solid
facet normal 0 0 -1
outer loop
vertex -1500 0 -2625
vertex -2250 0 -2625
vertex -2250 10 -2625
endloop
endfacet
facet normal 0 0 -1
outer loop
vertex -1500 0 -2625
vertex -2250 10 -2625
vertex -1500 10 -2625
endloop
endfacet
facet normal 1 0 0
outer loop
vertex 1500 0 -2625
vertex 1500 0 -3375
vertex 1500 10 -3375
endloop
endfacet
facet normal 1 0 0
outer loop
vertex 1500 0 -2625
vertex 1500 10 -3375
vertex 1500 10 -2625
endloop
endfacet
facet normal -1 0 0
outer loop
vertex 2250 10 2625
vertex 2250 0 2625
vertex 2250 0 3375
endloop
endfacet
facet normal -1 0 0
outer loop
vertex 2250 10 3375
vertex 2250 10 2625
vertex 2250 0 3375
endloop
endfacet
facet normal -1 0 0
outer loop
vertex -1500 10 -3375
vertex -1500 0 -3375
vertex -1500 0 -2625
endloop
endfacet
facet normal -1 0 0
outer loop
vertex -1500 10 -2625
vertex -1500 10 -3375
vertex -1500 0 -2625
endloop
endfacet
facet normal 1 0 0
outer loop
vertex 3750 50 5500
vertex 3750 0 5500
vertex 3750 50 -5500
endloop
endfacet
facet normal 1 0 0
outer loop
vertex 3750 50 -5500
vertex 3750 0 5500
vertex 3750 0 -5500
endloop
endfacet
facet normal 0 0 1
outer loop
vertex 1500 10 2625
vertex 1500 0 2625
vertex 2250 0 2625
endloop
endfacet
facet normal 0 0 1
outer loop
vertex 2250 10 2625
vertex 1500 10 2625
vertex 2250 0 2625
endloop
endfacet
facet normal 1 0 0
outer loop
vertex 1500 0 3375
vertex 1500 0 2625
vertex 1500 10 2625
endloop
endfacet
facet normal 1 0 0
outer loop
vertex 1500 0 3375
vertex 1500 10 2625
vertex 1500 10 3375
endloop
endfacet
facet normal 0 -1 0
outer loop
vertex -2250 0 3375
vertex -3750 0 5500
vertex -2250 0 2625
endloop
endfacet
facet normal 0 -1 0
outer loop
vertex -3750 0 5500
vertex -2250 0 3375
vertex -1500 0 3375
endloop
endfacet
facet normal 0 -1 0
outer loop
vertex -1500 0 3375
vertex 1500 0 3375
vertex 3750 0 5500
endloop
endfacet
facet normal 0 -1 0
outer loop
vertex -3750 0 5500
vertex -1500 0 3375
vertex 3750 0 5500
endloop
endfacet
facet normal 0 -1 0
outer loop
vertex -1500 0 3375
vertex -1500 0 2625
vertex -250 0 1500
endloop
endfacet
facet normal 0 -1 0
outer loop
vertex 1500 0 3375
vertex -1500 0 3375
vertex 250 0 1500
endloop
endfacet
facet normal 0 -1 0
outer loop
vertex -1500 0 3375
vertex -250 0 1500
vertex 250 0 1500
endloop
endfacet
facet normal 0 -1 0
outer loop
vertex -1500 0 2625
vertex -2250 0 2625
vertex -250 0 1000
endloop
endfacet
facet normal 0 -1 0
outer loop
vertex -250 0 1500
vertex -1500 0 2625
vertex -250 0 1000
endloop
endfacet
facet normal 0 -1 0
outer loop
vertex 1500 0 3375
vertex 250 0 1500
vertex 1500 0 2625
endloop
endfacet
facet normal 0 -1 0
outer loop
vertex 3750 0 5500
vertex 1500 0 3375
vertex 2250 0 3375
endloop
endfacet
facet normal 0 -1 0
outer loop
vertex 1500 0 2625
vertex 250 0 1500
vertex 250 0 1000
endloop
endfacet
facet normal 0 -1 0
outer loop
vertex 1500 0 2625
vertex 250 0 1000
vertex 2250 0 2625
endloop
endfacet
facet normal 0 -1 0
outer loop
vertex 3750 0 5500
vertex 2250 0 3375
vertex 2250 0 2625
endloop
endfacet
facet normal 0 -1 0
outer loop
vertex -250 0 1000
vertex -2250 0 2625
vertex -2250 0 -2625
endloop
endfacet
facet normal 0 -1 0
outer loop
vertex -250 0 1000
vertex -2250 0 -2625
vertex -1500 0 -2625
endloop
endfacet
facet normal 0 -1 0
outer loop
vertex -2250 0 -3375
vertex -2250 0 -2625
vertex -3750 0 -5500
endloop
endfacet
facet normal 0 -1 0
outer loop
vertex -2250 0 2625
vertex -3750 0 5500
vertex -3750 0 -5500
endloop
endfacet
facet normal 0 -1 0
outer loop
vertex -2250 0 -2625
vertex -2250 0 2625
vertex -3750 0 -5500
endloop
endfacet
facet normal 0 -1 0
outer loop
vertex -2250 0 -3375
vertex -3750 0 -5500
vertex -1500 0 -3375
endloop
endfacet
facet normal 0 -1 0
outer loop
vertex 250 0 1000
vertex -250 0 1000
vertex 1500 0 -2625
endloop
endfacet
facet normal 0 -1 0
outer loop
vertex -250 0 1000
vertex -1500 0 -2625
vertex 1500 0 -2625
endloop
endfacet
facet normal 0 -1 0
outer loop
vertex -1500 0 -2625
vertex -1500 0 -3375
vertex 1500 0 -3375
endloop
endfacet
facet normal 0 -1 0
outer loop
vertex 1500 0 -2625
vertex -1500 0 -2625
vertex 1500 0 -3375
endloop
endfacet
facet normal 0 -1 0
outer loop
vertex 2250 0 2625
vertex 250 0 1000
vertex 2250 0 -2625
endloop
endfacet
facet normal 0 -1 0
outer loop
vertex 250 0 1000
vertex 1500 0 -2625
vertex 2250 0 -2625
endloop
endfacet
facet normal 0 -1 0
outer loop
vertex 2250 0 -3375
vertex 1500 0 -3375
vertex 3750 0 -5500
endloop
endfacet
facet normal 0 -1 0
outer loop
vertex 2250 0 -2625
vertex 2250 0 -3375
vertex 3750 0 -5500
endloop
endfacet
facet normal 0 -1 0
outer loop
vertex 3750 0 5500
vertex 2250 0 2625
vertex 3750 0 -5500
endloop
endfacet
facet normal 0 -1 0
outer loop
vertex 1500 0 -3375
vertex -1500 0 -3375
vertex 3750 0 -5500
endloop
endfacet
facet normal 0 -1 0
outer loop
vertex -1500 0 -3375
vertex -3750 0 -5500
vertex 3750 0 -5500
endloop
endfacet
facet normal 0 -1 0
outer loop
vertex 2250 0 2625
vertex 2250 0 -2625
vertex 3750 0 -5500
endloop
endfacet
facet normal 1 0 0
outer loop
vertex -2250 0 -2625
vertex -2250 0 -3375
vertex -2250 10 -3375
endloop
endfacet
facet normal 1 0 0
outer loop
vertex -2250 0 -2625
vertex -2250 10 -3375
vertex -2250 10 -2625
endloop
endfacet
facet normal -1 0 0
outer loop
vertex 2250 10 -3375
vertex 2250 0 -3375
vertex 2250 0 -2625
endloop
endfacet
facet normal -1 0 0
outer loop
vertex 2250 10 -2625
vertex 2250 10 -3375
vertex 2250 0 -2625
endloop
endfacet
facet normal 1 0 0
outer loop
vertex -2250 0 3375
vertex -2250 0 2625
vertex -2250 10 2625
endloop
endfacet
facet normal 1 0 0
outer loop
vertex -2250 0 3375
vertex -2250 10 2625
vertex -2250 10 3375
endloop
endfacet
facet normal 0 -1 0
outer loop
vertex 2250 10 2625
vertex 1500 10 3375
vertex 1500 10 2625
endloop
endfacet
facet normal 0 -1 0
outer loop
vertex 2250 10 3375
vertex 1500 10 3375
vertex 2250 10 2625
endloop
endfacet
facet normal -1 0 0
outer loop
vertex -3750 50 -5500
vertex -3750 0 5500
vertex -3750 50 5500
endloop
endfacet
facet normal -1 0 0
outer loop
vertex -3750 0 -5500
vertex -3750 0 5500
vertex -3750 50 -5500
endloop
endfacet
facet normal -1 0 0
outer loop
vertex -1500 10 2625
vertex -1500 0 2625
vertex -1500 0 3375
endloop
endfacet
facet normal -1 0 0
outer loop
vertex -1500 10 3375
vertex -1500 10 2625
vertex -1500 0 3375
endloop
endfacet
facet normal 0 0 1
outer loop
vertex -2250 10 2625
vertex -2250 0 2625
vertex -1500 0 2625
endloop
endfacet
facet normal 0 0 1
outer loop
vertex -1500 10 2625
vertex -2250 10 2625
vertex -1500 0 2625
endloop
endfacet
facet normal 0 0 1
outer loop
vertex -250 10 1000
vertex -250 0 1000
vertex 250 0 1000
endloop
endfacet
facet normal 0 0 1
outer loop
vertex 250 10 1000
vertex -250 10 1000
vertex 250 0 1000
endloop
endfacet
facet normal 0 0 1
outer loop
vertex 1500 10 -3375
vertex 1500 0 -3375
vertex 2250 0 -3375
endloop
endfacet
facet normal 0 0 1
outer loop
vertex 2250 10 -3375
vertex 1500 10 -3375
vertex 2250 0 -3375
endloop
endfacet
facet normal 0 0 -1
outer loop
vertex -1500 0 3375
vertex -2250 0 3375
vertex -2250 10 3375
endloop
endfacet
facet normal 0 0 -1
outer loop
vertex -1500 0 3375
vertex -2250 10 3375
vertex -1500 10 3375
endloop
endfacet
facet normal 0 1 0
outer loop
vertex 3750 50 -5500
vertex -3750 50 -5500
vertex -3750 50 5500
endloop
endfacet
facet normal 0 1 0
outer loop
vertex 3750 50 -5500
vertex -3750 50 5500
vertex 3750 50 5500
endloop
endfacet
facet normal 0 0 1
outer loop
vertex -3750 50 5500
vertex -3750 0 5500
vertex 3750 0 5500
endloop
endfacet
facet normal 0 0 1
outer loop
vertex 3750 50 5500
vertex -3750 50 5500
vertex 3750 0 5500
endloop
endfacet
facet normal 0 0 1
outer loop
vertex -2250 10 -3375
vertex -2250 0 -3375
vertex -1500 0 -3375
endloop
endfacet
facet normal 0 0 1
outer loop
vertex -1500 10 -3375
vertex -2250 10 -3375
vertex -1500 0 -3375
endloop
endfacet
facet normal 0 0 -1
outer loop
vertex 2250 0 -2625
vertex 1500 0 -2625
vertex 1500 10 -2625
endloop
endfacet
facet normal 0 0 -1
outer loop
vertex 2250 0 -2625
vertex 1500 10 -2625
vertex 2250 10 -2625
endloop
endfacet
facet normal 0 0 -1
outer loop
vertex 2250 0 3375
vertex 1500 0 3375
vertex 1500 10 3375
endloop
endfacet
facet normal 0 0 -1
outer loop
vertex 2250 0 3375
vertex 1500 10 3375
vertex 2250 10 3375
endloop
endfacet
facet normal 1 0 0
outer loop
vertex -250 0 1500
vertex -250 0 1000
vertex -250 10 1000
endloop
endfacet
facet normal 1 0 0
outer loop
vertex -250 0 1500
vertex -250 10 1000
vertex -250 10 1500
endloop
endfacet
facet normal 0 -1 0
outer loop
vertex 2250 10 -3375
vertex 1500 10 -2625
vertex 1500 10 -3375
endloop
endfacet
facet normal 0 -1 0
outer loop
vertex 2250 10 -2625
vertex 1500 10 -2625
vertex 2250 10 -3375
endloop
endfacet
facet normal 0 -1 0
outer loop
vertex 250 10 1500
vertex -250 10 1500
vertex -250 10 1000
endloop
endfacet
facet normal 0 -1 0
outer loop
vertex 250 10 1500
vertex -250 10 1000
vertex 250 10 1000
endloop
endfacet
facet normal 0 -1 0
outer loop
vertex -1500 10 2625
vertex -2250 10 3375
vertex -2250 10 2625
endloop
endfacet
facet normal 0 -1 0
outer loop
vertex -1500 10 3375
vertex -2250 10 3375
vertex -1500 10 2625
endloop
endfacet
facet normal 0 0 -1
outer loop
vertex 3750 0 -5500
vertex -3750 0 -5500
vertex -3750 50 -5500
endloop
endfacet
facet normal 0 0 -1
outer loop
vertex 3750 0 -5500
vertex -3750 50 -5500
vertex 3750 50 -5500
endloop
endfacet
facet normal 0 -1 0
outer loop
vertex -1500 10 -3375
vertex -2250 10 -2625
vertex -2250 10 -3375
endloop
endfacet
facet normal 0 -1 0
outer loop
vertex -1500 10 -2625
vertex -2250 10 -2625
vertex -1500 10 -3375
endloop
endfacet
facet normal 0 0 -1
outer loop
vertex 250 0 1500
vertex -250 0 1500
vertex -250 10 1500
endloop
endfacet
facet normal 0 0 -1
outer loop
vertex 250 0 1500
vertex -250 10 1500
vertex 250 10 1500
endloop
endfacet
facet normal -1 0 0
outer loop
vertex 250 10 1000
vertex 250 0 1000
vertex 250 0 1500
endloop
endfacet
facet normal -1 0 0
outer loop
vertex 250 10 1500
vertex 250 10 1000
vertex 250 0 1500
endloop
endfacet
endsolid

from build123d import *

# Parameters (mm, degrees)
SKETCH1_W           = 7500
SKETCH1_H           = 11000
BOSS_EXTRUDE1_DEPTH = 50
SKETCH2_W           = 750
SKETCH2_H           = 750
SKETCH2_W_2         = 500
SKETCH2_H_2         = 500
CUT_EXTRUDE1_DEPTH  = 10


with BuildPart() as part:
    # Sketch1 → Boss-Extrude1 (new body)
    with BuildSketch(Plane(origin=(0, 0, 0), x_dir=(1, 0, 0), z_dir=(0, 1, 0))):
        Rectangle(SKETCH1_W, SKETCH1_H)
    extrude(amount=BOSS_EXTRUDE1_DEPTH)

    # Sketch2 → Cut-Extrude1 (cut)
    with BuildSketch(Plane.XZ):
        with Locations((1875, 3000)):
            Rectangle(SKETCH2_W, SKETCH2_H)
        with Locations((-1875, 3000)):
            Rectangle(SKETCH2_W, SKETCH2_H)
        with Locations((-1875, -3000)):
            Rectangle(SKETCH2_W, SKETCH2_H)
        with Locations((1875, -3000)):
            Rectangle(SKETCH2_W, SKETCH2_H)
        with Locations((0, 1250)):
            Rectangle(SKETCH2_W_2, SKETCH2_H_2)
    extrude(amount=-CUT_EXTRUDE1_DEPTH, mode=Mode.SUBTRACT)


solid = part.part
